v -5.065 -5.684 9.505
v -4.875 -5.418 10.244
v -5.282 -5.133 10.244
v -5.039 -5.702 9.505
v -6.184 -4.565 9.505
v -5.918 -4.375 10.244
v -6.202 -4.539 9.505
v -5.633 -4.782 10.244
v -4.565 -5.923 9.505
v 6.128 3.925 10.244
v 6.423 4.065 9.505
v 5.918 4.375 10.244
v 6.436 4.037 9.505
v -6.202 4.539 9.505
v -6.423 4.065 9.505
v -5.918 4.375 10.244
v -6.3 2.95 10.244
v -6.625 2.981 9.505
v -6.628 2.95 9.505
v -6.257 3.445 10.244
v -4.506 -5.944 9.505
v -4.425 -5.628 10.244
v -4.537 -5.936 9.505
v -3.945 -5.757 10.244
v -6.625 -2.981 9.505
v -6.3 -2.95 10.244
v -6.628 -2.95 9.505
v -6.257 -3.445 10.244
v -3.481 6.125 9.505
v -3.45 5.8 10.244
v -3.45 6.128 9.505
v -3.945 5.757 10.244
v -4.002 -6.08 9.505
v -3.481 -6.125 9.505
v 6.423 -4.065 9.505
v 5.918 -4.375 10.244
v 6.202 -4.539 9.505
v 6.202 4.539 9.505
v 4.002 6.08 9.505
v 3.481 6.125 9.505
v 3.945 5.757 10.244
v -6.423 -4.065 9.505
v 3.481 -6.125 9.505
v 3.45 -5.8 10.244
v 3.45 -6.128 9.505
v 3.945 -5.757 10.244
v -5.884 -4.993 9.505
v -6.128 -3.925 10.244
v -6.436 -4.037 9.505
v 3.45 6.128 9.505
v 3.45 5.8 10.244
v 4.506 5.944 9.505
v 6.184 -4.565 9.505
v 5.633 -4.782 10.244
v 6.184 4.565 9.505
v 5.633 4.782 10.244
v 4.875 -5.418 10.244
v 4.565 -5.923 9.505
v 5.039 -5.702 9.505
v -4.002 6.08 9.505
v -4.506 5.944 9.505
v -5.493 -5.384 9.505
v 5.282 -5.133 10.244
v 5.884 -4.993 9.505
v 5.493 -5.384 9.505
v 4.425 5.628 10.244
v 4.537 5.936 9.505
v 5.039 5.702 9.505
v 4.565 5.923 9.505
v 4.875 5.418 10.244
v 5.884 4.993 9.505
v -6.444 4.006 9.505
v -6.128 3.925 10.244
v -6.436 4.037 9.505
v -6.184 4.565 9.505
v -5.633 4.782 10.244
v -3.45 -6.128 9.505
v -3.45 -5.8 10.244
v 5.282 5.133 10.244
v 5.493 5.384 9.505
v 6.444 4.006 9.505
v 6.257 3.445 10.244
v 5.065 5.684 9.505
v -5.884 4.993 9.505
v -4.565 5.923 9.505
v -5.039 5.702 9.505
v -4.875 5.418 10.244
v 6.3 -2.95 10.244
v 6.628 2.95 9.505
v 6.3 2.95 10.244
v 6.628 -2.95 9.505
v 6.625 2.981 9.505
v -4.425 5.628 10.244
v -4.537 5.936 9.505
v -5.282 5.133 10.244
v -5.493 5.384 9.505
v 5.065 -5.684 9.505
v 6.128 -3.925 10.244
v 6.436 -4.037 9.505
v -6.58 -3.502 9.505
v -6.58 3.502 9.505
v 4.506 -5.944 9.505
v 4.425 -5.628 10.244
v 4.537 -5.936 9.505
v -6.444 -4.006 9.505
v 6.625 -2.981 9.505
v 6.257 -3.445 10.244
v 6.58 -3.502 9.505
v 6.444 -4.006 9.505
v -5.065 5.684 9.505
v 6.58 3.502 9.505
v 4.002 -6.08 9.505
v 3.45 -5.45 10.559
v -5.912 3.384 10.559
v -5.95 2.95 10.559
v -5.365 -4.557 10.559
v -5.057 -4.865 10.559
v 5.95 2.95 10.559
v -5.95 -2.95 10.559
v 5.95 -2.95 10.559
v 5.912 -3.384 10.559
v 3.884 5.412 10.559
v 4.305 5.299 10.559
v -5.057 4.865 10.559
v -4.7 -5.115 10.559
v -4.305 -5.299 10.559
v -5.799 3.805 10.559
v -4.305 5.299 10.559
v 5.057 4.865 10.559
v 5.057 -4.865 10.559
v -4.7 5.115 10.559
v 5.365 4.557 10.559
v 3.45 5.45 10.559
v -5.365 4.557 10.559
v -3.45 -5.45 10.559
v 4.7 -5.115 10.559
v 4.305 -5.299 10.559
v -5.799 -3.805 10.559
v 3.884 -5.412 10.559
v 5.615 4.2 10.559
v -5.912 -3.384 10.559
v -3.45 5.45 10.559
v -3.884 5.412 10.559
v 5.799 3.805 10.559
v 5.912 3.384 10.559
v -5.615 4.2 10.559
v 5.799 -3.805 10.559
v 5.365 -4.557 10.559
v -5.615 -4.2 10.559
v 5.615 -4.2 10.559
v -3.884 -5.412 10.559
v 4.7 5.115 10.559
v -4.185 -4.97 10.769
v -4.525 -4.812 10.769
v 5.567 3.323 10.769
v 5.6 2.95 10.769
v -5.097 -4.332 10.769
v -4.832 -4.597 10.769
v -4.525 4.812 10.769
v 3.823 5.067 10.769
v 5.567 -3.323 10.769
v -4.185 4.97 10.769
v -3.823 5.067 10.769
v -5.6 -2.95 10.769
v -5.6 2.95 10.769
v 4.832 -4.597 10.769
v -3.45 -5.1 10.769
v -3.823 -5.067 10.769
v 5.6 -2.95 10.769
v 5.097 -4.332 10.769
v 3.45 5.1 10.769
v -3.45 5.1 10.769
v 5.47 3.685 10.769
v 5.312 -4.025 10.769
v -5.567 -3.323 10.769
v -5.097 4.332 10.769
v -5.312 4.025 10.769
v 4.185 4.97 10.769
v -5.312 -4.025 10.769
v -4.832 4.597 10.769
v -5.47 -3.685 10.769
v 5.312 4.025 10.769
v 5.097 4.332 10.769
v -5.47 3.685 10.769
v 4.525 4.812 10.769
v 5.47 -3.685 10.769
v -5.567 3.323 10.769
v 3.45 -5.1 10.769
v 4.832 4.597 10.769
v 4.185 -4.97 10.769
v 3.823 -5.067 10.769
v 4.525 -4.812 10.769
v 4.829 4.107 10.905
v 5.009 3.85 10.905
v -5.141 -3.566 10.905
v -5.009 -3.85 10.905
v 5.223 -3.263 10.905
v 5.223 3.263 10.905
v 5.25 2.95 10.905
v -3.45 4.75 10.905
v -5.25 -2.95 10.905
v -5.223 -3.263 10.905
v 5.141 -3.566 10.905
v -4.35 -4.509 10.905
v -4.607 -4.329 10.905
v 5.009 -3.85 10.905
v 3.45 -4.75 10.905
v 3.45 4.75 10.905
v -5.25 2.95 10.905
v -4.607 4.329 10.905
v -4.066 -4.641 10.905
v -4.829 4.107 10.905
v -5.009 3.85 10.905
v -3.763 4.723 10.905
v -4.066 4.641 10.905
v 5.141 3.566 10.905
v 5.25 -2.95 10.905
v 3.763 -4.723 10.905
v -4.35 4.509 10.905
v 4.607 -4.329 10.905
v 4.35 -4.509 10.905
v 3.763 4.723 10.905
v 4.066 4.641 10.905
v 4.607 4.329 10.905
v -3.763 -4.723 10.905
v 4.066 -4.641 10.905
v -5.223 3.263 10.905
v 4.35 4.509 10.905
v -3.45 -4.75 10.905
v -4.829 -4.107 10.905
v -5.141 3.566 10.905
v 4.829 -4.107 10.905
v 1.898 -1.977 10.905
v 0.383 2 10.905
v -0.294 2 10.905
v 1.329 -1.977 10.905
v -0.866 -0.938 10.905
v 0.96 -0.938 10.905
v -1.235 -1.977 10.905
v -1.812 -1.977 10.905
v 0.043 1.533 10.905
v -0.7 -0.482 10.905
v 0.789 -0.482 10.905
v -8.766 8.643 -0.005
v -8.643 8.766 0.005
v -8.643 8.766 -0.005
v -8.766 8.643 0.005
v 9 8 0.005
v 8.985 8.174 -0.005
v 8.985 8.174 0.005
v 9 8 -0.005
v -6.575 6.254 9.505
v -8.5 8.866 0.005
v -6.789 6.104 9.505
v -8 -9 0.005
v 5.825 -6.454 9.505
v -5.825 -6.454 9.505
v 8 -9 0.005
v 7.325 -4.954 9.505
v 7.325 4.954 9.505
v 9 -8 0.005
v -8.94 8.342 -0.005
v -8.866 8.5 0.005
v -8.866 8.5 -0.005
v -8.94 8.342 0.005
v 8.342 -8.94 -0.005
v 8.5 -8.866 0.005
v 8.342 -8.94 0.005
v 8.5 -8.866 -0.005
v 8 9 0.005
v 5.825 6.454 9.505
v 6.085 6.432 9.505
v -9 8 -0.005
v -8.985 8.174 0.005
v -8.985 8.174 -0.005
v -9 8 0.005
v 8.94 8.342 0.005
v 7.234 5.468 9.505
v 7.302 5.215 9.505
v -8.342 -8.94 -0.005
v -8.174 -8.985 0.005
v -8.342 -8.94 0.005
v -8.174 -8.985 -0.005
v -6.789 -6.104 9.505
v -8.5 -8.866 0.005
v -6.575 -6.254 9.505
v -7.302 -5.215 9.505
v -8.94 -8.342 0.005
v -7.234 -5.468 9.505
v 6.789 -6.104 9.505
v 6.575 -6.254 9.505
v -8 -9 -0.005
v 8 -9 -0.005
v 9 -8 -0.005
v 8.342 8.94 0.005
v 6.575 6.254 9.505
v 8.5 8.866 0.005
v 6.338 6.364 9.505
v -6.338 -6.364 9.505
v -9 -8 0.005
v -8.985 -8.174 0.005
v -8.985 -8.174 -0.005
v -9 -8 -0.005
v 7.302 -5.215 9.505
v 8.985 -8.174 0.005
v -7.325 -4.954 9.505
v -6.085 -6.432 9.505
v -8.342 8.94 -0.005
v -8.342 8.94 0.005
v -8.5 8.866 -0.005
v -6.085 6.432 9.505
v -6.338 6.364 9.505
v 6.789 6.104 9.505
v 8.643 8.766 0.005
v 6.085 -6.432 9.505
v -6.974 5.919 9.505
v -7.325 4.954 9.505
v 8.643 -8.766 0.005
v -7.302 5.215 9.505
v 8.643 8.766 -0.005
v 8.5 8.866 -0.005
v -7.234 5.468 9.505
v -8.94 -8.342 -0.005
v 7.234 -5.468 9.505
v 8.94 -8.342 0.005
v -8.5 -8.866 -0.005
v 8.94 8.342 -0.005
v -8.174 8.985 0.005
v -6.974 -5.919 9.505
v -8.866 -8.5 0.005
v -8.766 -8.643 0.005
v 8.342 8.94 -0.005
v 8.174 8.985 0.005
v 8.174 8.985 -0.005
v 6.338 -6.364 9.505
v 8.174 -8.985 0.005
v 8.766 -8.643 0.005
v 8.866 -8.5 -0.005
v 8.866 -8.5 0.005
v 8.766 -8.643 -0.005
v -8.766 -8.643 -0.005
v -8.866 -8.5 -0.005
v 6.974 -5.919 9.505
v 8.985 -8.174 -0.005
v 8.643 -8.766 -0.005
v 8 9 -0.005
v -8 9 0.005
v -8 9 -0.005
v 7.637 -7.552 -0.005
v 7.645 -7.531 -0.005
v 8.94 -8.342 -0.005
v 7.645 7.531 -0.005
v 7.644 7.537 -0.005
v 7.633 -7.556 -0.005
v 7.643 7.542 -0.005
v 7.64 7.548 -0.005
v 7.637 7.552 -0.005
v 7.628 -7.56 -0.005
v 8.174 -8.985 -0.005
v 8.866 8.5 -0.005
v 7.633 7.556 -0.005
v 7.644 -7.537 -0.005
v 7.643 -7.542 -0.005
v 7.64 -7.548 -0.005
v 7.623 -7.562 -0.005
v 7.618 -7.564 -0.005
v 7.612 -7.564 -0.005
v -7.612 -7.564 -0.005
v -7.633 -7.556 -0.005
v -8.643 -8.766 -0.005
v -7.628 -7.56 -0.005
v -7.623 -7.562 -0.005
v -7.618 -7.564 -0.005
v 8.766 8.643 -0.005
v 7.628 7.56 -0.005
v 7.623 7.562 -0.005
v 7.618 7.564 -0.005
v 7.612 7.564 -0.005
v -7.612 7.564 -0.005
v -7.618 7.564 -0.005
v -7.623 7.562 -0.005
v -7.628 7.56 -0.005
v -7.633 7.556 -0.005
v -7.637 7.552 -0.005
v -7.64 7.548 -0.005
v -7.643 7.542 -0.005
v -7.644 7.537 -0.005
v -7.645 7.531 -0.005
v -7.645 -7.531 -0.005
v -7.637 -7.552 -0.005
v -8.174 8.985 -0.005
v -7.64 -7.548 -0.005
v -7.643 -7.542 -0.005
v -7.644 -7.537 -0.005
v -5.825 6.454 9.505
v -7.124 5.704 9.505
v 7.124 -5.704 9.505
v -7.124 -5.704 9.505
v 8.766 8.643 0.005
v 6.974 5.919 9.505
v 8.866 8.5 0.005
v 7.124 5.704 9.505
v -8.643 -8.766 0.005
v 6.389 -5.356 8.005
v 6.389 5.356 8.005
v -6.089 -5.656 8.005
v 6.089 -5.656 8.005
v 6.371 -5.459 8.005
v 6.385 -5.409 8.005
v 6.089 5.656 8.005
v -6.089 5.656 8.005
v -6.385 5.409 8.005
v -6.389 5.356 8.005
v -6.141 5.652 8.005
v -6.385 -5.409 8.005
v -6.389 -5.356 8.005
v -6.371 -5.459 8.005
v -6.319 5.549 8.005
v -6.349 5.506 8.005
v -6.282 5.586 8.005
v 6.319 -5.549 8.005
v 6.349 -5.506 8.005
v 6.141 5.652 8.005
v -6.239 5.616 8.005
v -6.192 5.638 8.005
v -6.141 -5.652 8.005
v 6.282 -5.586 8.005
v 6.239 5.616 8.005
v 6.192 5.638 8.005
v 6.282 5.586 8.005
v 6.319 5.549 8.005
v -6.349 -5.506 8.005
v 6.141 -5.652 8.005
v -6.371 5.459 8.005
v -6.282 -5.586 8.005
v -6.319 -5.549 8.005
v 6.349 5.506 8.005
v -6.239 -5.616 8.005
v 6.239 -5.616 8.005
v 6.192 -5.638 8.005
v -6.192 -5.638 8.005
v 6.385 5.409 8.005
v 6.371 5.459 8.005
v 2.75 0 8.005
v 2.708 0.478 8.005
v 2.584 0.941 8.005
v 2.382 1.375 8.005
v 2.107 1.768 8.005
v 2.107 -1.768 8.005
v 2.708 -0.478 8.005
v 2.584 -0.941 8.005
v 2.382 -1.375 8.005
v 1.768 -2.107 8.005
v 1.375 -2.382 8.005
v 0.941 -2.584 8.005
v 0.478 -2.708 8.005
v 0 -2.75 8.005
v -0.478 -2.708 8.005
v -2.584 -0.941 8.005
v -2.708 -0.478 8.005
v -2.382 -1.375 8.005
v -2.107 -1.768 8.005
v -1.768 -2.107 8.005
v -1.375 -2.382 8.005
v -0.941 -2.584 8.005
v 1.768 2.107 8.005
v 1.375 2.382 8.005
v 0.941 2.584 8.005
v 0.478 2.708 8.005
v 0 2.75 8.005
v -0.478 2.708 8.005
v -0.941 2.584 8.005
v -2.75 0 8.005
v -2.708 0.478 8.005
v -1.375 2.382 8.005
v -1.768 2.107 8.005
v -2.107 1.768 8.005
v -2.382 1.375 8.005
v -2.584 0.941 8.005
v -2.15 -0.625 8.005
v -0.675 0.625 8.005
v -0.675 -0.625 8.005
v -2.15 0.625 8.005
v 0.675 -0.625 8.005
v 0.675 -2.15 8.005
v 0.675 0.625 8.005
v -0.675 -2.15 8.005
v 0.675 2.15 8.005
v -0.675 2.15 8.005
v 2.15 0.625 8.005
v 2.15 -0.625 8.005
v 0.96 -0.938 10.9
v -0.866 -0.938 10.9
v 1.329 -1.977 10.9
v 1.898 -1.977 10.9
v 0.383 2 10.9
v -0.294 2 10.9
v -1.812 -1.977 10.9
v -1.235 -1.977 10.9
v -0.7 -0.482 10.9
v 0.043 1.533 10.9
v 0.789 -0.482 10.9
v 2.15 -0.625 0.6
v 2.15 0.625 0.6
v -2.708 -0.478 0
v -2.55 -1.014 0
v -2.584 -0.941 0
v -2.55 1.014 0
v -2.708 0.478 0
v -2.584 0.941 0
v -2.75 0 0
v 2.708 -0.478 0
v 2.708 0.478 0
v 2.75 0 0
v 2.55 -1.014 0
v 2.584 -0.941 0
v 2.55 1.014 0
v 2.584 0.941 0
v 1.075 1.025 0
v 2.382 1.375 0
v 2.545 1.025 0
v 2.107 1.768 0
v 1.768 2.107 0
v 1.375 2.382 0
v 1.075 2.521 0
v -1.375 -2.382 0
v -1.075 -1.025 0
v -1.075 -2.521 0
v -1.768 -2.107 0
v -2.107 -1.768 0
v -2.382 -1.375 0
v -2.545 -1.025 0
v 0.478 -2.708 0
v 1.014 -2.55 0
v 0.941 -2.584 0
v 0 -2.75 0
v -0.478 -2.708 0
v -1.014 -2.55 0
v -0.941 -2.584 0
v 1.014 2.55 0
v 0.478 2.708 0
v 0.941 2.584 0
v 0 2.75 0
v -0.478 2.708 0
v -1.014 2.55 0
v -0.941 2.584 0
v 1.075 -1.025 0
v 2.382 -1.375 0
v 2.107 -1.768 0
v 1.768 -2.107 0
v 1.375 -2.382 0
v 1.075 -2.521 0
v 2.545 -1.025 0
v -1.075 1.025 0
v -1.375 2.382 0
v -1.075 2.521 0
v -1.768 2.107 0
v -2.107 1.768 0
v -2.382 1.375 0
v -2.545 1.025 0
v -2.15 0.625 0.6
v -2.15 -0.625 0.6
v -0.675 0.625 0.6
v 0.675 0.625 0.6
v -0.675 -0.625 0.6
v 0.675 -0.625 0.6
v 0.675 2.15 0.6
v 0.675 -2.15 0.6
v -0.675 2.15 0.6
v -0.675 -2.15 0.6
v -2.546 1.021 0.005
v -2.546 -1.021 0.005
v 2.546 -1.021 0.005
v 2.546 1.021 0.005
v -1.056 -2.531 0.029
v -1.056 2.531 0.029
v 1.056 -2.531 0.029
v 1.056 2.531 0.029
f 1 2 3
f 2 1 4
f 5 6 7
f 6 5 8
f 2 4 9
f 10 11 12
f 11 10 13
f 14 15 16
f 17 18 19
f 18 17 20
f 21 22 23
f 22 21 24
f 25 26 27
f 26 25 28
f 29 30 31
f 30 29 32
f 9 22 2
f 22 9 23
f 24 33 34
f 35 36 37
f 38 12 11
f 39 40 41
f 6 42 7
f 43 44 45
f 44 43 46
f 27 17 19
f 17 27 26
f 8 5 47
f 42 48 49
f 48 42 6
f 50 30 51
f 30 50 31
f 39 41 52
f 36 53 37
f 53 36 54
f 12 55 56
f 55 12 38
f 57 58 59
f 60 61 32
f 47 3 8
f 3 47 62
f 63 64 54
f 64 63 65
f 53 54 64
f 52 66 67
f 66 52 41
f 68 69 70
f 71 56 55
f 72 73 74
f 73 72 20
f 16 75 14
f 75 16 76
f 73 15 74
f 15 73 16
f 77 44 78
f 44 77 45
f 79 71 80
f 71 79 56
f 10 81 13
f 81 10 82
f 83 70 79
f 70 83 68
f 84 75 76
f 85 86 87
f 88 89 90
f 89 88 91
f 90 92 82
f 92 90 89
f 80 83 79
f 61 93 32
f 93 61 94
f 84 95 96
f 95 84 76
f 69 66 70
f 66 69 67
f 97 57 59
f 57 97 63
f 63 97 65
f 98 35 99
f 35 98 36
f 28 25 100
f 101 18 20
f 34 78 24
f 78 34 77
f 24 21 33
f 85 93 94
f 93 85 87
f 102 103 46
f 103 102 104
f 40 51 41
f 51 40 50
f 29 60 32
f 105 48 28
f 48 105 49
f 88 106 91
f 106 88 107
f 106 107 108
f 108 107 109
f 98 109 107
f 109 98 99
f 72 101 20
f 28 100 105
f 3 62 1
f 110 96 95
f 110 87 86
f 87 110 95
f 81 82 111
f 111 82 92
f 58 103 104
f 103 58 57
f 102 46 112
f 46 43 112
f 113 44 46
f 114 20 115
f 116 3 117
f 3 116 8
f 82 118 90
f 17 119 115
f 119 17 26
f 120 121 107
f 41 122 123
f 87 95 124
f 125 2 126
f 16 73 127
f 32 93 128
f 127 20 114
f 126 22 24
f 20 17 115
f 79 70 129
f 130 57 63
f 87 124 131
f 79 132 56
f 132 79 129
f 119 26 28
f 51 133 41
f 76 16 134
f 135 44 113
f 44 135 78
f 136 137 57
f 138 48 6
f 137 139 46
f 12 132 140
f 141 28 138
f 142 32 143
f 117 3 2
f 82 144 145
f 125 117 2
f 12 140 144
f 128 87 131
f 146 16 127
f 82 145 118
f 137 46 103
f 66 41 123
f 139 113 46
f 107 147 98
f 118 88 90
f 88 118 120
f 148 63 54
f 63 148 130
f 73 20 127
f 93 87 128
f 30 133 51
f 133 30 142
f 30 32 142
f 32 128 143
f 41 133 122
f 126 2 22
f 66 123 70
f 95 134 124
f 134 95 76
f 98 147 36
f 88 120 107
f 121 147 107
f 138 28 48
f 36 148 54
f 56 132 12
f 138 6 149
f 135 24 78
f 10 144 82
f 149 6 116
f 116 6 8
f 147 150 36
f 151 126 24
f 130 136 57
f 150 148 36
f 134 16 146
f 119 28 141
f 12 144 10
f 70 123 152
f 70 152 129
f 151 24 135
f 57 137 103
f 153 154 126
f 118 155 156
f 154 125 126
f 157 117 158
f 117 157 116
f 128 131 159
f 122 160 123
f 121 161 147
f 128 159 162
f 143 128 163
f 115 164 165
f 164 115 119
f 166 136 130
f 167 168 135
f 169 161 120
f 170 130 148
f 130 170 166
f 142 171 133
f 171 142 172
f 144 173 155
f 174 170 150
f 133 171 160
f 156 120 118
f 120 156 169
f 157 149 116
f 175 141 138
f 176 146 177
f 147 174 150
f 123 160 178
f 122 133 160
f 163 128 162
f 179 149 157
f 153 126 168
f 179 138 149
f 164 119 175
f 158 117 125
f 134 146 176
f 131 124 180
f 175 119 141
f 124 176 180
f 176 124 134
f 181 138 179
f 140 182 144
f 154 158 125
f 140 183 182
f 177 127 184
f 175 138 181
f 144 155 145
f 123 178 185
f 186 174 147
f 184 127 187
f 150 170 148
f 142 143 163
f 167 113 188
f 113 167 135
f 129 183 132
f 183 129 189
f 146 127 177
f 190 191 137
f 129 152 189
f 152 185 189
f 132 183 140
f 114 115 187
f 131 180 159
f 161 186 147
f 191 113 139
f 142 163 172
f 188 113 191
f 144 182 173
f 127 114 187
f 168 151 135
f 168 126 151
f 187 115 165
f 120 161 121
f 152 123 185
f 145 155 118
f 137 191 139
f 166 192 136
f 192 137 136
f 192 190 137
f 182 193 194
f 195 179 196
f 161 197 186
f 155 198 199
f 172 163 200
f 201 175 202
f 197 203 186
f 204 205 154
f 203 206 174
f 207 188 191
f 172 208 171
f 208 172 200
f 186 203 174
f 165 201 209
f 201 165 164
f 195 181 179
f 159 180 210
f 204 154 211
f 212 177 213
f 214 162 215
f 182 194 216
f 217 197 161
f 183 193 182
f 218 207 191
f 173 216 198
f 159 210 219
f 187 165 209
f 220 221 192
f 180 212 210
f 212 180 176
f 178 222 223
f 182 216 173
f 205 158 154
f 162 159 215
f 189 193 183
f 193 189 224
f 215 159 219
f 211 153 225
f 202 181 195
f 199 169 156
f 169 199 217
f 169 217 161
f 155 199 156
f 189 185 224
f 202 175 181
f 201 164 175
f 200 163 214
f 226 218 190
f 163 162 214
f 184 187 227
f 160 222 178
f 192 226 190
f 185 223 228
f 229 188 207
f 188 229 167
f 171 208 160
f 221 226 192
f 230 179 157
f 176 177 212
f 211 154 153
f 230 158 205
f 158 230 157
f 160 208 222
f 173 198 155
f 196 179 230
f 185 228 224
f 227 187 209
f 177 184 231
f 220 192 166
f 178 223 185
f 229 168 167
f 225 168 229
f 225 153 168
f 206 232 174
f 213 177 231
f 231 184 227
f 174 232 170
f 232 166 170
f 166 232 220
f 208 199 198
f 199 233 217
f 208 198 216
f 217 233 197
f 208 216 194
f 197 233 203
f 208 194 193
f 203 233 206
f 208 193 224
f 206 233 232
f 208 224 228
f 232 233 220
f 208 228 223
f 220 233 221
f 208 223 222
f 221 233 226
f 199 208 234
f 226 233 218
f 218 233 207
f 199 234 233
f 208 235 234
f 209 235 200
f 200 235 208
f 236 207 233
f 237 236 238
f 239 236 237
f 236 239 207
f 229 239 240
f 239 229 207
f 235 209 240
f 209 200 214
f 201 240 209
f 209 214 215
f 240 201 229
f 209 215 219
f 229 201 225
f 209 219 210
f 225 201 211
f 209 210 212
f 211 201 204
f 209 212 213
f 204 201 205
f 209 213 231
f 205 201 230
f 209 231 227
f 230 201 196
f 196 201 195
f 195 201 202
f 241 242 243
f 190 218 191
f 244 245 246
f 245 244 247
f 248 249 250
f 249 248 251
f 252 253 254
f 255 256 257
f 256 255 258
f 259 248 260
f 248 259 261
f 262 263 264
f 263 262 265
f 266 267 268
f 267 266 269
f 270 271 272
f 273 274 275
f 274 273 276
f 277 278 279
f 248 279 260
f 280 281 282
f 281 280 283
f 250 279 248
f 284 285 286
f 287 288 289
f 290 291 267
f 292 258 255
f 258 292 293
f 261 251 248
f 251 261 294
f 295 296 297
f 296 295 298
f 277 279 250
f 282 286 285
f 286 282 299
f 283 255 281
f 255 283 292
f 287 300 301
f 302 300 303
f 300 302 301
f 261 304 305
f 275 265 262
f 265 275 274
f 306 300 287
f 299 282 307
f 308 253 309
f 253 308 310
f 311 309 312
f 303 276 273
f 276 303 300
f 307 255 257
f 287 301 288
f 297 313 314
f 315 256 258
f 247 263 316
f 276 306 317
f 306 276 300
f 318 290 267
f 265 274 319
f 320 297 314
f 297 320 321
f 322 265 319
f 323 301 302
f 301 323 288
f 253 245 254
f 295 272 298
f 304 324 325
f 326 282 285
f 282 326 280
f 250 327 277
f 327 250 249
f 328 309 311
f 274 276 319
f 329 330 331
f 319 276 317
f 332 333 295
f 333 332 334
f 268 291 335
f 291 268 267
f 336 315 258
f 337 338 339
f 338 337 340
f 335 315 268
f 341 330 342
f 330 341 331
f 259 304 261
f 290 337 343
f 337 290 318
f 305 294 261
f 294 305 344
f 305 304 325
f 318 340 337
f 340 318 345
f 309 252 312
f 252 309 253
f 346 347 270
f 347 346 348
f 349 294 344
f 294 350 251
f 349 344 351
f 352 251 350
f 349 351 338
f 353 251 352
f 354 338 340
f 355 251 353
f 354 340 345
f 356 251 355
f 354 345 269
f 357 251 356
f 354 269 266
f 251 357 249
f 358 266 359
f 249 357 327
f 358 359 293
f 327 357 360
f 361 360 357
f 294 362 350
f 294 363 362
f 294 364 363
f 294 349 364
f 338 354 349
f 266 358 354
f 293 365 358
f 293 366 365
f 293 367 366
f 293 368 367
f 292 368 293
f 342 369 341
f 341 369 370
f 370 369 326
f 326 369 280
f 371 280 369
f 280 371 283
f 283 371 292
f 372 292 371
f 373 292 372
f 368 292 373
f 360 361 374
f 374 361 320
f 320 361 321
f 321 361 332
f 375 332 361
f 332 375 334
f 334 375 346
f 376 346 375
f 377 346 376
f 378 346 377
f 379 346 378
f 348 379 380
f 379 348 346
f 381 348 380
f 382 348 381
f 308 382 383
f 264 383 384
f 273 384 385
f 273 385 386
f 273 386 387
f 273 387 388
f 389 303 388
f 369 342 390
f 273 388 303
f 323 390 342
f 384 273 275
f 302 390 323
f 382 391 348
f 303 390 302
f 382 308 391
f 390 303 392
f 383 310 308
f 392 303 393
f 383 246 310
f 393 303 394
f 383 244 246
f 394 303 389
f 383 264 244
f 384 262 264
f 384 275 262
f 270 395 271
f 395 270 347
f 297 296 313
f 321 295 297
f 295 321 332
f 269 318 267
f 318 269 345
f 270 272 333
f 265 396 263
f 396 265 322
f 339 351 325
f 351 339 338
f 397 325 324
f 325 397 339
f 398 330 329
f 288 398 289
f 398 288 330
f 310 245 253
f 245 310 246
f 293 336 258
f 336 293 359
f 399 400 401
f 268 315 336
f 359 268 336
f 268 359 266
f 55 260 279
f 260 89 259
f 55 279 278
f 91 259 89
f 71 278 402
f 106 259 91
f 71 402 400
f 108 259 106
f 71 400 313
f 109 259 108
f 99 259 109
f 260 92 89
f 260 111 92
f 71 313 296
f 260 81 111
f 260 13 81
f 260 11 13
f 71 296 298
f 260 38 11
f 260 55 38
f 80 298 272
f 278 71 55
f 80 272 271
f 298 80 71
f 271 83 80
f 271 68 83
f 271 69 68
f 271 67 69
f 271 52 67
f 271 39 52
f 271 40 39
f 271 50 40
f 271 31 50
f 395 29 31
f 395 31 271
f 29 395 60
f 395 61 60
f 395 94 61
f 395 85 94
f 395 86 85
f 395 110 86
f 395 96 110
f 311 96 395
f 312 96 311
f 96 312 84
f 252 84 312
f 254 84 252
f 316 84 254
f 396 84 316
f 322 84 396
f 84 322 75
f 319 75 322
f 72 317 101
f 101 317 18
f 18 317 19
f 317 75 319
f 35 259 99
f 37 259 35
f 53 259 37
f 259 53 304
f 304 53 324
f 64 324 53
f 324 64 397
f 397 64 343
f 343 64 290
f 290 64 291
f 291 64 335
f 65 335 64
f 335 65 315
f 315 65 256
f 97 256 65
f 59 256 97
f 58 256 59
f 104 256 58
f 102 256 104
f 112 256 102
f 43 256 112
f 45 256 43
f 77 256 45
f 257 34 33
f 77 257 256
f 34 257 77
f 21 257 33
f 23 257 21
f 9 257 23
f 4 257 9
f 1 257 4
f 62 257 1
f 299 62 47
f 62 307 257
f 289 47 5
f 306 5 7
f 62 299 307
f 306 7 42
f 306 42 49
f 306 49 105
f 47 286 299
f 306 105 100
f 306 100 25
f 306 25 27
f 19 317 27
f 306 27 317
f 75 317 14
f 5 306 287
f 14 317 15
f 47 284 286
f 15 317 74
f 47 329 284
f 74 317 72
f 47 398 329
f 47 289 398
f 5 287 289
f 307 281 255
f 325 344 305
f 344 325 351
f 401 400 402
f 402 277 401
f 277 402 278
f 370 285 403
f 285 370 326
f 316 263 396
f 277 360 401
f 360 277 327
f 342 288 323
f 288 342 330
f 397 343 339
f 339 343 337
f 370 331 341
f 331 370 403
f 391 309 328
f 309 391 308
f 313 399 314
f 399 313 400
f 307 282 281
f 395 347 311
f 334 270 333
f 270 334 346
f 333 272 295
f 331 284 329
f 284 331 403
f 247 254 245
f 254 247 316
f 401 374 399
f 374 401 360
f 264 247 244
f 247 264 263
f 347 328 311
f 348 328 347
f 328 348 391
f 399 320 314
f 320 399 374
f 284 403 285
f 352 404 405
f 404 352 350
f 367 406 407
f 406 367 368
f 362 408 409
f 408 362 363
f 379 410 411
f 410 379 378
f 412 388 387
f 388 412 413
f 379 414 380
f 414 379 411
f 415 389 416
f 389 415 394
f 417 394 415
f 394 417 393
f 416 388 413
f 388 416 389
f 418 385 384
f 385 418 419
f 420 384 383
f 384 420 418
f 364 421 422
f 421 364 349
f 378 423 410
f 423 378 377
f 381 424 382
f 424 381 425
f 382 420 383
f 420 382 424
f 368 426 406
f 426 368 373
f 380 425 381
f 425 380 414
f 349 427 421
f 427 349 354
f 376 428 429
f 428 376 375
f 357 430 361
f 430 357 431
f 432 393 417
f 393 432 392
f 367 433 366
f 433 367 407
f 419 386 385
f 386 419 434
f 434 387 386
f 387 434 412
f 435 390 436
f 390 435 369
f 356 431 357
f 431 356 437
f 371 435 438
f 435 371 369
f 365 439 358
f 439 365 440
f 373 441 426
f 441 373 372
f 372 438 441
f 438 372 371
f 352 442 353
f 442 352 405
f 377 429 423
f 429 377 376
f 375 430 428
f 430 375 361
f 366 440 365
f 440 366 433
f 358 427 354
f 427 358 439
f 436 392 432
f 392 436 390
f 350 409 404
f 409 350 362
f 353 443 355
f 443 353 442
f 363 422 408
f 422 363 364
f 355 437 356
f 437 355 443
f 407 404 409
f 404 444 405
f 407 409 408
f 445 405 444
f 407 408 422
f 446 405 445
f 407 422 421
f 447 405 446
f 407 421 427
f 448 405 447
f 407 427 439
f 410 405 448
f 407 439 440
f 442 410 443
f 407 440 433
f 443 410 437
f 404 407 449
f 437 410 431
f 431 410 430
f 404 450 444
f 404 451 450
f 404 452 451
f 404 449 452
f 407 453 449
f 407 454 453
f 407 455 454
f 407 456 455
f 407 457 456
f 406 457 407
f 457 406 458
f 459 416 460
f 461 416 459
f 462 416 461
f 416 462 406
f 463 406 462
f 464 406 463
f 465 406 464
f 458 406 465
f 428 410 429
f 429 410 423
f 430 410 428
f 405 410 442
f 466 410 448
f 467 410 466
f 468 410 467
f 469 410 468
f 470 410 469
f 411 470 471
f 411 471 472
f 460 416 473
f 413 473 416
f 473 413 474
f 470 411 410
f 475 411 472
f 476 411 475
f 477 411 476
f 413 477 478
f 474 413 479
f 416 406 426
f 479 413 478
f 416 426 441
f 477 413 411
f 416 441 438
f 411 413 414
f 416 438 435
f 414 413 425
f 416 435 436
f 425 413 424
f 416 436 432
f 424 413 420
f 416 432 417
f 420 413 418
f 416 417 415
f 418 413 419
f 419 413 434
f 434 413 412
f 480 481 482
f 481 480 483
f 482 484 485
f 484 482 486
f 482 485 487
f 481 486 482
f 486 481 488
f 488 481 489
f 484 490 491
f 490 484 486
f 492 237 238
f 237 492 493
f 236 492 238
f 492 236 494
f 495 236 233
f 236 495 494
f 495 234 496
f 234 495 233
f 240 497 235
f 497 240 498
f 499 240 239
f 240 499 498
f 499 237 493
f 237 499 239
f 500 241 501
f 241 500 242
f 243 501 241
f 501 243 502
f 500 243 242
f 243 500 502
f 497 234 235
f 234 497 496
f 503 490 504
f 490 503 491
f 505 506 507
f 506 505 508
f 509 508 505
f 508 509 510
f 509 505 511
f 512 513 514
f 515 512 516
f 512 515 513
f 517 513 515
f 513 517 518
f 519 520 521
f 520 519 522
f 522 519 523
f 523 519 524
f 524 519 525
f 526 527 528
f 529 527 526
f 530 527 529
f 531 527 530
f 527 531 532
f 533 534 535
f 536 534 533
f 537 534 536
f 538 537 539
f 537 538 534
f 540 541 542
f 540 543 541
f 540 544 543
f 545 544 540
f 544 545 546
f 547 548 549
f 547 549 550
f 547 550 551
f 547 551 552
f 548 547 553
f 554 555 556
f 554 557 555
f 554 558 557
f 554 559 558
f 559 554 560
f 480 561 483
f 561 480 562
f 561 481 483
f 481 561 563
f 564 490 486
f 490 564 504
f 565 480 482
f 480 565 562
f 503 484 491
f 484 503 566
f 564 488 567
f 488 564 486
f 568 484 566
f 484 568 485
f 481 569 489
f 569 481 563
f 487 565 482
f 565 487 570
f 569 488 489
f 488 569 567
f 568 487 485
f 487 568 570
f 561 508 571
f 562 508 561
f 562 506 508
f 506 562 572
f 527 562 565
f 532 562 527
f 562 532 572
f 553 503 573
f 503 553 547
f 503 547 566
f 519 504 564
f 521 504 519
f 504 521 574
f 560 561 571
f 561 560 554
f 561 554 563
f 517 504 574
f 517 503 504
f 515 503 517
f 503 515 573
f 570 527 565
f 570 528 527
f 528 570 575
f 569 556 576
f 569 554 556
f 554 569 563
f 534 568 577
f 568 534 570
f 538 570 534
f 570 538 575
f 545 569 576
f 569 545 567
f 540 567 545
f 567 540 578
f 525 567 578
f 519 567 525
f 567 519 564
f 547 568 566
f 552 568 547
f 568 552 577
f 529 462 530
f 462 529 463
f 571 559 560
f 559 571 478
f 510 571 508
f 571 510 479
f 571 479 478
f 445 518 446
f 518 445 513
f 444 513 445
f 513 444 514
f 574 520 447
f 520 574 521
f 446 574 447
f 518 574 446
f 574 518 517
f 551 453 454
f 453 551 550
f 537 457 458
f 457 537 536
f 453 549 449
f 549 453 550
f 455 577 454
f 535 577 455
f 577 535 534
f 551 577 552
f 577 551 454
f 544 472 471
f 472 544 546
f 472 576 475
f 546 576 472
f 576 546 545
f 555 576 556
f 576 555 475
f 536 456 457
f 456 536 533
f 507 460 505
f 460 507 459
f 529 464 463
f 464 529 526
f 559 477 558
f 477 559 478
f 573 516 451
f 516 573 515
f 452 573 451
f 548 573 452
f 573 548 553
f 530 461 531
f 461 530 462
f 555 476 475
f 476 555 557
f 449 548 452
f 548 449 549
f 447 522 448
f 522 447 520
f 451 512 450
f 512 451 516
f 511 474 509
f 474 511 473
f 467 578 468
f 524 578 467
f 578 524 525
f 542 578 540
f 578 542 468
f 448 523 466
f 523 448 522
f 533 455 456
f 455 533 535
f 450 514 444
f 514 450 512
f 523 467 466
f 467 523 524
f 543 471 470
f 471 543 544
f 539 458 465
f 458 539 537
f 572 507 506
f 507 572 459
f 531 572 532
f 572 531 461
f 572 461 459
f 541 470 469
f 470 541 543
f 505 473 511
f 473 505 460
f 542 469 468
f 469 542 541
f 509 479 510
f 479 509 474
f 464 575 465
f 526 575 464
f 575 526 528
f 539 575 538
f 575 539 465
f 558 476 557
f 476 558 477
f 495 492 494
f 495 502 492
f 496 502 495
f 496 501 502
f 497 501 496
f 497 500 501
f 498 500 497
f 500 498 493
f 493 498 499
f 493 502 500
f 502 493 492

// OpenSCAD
export_target = "preview";
include <common/custom-shell-params.scad>

user_top_hat_enabled = true;
user_top_hat_top_width = 10.5;
user_top_hat_top_depth = 9.5;
user_top_hat_top_radius = 1.8;
user_top_hat_height = 1.4;
user_top_hat_shoulder_angle = 45;
user_top_hat_shoulder_radius = 1.0;

include <../base/keycap.scad>
